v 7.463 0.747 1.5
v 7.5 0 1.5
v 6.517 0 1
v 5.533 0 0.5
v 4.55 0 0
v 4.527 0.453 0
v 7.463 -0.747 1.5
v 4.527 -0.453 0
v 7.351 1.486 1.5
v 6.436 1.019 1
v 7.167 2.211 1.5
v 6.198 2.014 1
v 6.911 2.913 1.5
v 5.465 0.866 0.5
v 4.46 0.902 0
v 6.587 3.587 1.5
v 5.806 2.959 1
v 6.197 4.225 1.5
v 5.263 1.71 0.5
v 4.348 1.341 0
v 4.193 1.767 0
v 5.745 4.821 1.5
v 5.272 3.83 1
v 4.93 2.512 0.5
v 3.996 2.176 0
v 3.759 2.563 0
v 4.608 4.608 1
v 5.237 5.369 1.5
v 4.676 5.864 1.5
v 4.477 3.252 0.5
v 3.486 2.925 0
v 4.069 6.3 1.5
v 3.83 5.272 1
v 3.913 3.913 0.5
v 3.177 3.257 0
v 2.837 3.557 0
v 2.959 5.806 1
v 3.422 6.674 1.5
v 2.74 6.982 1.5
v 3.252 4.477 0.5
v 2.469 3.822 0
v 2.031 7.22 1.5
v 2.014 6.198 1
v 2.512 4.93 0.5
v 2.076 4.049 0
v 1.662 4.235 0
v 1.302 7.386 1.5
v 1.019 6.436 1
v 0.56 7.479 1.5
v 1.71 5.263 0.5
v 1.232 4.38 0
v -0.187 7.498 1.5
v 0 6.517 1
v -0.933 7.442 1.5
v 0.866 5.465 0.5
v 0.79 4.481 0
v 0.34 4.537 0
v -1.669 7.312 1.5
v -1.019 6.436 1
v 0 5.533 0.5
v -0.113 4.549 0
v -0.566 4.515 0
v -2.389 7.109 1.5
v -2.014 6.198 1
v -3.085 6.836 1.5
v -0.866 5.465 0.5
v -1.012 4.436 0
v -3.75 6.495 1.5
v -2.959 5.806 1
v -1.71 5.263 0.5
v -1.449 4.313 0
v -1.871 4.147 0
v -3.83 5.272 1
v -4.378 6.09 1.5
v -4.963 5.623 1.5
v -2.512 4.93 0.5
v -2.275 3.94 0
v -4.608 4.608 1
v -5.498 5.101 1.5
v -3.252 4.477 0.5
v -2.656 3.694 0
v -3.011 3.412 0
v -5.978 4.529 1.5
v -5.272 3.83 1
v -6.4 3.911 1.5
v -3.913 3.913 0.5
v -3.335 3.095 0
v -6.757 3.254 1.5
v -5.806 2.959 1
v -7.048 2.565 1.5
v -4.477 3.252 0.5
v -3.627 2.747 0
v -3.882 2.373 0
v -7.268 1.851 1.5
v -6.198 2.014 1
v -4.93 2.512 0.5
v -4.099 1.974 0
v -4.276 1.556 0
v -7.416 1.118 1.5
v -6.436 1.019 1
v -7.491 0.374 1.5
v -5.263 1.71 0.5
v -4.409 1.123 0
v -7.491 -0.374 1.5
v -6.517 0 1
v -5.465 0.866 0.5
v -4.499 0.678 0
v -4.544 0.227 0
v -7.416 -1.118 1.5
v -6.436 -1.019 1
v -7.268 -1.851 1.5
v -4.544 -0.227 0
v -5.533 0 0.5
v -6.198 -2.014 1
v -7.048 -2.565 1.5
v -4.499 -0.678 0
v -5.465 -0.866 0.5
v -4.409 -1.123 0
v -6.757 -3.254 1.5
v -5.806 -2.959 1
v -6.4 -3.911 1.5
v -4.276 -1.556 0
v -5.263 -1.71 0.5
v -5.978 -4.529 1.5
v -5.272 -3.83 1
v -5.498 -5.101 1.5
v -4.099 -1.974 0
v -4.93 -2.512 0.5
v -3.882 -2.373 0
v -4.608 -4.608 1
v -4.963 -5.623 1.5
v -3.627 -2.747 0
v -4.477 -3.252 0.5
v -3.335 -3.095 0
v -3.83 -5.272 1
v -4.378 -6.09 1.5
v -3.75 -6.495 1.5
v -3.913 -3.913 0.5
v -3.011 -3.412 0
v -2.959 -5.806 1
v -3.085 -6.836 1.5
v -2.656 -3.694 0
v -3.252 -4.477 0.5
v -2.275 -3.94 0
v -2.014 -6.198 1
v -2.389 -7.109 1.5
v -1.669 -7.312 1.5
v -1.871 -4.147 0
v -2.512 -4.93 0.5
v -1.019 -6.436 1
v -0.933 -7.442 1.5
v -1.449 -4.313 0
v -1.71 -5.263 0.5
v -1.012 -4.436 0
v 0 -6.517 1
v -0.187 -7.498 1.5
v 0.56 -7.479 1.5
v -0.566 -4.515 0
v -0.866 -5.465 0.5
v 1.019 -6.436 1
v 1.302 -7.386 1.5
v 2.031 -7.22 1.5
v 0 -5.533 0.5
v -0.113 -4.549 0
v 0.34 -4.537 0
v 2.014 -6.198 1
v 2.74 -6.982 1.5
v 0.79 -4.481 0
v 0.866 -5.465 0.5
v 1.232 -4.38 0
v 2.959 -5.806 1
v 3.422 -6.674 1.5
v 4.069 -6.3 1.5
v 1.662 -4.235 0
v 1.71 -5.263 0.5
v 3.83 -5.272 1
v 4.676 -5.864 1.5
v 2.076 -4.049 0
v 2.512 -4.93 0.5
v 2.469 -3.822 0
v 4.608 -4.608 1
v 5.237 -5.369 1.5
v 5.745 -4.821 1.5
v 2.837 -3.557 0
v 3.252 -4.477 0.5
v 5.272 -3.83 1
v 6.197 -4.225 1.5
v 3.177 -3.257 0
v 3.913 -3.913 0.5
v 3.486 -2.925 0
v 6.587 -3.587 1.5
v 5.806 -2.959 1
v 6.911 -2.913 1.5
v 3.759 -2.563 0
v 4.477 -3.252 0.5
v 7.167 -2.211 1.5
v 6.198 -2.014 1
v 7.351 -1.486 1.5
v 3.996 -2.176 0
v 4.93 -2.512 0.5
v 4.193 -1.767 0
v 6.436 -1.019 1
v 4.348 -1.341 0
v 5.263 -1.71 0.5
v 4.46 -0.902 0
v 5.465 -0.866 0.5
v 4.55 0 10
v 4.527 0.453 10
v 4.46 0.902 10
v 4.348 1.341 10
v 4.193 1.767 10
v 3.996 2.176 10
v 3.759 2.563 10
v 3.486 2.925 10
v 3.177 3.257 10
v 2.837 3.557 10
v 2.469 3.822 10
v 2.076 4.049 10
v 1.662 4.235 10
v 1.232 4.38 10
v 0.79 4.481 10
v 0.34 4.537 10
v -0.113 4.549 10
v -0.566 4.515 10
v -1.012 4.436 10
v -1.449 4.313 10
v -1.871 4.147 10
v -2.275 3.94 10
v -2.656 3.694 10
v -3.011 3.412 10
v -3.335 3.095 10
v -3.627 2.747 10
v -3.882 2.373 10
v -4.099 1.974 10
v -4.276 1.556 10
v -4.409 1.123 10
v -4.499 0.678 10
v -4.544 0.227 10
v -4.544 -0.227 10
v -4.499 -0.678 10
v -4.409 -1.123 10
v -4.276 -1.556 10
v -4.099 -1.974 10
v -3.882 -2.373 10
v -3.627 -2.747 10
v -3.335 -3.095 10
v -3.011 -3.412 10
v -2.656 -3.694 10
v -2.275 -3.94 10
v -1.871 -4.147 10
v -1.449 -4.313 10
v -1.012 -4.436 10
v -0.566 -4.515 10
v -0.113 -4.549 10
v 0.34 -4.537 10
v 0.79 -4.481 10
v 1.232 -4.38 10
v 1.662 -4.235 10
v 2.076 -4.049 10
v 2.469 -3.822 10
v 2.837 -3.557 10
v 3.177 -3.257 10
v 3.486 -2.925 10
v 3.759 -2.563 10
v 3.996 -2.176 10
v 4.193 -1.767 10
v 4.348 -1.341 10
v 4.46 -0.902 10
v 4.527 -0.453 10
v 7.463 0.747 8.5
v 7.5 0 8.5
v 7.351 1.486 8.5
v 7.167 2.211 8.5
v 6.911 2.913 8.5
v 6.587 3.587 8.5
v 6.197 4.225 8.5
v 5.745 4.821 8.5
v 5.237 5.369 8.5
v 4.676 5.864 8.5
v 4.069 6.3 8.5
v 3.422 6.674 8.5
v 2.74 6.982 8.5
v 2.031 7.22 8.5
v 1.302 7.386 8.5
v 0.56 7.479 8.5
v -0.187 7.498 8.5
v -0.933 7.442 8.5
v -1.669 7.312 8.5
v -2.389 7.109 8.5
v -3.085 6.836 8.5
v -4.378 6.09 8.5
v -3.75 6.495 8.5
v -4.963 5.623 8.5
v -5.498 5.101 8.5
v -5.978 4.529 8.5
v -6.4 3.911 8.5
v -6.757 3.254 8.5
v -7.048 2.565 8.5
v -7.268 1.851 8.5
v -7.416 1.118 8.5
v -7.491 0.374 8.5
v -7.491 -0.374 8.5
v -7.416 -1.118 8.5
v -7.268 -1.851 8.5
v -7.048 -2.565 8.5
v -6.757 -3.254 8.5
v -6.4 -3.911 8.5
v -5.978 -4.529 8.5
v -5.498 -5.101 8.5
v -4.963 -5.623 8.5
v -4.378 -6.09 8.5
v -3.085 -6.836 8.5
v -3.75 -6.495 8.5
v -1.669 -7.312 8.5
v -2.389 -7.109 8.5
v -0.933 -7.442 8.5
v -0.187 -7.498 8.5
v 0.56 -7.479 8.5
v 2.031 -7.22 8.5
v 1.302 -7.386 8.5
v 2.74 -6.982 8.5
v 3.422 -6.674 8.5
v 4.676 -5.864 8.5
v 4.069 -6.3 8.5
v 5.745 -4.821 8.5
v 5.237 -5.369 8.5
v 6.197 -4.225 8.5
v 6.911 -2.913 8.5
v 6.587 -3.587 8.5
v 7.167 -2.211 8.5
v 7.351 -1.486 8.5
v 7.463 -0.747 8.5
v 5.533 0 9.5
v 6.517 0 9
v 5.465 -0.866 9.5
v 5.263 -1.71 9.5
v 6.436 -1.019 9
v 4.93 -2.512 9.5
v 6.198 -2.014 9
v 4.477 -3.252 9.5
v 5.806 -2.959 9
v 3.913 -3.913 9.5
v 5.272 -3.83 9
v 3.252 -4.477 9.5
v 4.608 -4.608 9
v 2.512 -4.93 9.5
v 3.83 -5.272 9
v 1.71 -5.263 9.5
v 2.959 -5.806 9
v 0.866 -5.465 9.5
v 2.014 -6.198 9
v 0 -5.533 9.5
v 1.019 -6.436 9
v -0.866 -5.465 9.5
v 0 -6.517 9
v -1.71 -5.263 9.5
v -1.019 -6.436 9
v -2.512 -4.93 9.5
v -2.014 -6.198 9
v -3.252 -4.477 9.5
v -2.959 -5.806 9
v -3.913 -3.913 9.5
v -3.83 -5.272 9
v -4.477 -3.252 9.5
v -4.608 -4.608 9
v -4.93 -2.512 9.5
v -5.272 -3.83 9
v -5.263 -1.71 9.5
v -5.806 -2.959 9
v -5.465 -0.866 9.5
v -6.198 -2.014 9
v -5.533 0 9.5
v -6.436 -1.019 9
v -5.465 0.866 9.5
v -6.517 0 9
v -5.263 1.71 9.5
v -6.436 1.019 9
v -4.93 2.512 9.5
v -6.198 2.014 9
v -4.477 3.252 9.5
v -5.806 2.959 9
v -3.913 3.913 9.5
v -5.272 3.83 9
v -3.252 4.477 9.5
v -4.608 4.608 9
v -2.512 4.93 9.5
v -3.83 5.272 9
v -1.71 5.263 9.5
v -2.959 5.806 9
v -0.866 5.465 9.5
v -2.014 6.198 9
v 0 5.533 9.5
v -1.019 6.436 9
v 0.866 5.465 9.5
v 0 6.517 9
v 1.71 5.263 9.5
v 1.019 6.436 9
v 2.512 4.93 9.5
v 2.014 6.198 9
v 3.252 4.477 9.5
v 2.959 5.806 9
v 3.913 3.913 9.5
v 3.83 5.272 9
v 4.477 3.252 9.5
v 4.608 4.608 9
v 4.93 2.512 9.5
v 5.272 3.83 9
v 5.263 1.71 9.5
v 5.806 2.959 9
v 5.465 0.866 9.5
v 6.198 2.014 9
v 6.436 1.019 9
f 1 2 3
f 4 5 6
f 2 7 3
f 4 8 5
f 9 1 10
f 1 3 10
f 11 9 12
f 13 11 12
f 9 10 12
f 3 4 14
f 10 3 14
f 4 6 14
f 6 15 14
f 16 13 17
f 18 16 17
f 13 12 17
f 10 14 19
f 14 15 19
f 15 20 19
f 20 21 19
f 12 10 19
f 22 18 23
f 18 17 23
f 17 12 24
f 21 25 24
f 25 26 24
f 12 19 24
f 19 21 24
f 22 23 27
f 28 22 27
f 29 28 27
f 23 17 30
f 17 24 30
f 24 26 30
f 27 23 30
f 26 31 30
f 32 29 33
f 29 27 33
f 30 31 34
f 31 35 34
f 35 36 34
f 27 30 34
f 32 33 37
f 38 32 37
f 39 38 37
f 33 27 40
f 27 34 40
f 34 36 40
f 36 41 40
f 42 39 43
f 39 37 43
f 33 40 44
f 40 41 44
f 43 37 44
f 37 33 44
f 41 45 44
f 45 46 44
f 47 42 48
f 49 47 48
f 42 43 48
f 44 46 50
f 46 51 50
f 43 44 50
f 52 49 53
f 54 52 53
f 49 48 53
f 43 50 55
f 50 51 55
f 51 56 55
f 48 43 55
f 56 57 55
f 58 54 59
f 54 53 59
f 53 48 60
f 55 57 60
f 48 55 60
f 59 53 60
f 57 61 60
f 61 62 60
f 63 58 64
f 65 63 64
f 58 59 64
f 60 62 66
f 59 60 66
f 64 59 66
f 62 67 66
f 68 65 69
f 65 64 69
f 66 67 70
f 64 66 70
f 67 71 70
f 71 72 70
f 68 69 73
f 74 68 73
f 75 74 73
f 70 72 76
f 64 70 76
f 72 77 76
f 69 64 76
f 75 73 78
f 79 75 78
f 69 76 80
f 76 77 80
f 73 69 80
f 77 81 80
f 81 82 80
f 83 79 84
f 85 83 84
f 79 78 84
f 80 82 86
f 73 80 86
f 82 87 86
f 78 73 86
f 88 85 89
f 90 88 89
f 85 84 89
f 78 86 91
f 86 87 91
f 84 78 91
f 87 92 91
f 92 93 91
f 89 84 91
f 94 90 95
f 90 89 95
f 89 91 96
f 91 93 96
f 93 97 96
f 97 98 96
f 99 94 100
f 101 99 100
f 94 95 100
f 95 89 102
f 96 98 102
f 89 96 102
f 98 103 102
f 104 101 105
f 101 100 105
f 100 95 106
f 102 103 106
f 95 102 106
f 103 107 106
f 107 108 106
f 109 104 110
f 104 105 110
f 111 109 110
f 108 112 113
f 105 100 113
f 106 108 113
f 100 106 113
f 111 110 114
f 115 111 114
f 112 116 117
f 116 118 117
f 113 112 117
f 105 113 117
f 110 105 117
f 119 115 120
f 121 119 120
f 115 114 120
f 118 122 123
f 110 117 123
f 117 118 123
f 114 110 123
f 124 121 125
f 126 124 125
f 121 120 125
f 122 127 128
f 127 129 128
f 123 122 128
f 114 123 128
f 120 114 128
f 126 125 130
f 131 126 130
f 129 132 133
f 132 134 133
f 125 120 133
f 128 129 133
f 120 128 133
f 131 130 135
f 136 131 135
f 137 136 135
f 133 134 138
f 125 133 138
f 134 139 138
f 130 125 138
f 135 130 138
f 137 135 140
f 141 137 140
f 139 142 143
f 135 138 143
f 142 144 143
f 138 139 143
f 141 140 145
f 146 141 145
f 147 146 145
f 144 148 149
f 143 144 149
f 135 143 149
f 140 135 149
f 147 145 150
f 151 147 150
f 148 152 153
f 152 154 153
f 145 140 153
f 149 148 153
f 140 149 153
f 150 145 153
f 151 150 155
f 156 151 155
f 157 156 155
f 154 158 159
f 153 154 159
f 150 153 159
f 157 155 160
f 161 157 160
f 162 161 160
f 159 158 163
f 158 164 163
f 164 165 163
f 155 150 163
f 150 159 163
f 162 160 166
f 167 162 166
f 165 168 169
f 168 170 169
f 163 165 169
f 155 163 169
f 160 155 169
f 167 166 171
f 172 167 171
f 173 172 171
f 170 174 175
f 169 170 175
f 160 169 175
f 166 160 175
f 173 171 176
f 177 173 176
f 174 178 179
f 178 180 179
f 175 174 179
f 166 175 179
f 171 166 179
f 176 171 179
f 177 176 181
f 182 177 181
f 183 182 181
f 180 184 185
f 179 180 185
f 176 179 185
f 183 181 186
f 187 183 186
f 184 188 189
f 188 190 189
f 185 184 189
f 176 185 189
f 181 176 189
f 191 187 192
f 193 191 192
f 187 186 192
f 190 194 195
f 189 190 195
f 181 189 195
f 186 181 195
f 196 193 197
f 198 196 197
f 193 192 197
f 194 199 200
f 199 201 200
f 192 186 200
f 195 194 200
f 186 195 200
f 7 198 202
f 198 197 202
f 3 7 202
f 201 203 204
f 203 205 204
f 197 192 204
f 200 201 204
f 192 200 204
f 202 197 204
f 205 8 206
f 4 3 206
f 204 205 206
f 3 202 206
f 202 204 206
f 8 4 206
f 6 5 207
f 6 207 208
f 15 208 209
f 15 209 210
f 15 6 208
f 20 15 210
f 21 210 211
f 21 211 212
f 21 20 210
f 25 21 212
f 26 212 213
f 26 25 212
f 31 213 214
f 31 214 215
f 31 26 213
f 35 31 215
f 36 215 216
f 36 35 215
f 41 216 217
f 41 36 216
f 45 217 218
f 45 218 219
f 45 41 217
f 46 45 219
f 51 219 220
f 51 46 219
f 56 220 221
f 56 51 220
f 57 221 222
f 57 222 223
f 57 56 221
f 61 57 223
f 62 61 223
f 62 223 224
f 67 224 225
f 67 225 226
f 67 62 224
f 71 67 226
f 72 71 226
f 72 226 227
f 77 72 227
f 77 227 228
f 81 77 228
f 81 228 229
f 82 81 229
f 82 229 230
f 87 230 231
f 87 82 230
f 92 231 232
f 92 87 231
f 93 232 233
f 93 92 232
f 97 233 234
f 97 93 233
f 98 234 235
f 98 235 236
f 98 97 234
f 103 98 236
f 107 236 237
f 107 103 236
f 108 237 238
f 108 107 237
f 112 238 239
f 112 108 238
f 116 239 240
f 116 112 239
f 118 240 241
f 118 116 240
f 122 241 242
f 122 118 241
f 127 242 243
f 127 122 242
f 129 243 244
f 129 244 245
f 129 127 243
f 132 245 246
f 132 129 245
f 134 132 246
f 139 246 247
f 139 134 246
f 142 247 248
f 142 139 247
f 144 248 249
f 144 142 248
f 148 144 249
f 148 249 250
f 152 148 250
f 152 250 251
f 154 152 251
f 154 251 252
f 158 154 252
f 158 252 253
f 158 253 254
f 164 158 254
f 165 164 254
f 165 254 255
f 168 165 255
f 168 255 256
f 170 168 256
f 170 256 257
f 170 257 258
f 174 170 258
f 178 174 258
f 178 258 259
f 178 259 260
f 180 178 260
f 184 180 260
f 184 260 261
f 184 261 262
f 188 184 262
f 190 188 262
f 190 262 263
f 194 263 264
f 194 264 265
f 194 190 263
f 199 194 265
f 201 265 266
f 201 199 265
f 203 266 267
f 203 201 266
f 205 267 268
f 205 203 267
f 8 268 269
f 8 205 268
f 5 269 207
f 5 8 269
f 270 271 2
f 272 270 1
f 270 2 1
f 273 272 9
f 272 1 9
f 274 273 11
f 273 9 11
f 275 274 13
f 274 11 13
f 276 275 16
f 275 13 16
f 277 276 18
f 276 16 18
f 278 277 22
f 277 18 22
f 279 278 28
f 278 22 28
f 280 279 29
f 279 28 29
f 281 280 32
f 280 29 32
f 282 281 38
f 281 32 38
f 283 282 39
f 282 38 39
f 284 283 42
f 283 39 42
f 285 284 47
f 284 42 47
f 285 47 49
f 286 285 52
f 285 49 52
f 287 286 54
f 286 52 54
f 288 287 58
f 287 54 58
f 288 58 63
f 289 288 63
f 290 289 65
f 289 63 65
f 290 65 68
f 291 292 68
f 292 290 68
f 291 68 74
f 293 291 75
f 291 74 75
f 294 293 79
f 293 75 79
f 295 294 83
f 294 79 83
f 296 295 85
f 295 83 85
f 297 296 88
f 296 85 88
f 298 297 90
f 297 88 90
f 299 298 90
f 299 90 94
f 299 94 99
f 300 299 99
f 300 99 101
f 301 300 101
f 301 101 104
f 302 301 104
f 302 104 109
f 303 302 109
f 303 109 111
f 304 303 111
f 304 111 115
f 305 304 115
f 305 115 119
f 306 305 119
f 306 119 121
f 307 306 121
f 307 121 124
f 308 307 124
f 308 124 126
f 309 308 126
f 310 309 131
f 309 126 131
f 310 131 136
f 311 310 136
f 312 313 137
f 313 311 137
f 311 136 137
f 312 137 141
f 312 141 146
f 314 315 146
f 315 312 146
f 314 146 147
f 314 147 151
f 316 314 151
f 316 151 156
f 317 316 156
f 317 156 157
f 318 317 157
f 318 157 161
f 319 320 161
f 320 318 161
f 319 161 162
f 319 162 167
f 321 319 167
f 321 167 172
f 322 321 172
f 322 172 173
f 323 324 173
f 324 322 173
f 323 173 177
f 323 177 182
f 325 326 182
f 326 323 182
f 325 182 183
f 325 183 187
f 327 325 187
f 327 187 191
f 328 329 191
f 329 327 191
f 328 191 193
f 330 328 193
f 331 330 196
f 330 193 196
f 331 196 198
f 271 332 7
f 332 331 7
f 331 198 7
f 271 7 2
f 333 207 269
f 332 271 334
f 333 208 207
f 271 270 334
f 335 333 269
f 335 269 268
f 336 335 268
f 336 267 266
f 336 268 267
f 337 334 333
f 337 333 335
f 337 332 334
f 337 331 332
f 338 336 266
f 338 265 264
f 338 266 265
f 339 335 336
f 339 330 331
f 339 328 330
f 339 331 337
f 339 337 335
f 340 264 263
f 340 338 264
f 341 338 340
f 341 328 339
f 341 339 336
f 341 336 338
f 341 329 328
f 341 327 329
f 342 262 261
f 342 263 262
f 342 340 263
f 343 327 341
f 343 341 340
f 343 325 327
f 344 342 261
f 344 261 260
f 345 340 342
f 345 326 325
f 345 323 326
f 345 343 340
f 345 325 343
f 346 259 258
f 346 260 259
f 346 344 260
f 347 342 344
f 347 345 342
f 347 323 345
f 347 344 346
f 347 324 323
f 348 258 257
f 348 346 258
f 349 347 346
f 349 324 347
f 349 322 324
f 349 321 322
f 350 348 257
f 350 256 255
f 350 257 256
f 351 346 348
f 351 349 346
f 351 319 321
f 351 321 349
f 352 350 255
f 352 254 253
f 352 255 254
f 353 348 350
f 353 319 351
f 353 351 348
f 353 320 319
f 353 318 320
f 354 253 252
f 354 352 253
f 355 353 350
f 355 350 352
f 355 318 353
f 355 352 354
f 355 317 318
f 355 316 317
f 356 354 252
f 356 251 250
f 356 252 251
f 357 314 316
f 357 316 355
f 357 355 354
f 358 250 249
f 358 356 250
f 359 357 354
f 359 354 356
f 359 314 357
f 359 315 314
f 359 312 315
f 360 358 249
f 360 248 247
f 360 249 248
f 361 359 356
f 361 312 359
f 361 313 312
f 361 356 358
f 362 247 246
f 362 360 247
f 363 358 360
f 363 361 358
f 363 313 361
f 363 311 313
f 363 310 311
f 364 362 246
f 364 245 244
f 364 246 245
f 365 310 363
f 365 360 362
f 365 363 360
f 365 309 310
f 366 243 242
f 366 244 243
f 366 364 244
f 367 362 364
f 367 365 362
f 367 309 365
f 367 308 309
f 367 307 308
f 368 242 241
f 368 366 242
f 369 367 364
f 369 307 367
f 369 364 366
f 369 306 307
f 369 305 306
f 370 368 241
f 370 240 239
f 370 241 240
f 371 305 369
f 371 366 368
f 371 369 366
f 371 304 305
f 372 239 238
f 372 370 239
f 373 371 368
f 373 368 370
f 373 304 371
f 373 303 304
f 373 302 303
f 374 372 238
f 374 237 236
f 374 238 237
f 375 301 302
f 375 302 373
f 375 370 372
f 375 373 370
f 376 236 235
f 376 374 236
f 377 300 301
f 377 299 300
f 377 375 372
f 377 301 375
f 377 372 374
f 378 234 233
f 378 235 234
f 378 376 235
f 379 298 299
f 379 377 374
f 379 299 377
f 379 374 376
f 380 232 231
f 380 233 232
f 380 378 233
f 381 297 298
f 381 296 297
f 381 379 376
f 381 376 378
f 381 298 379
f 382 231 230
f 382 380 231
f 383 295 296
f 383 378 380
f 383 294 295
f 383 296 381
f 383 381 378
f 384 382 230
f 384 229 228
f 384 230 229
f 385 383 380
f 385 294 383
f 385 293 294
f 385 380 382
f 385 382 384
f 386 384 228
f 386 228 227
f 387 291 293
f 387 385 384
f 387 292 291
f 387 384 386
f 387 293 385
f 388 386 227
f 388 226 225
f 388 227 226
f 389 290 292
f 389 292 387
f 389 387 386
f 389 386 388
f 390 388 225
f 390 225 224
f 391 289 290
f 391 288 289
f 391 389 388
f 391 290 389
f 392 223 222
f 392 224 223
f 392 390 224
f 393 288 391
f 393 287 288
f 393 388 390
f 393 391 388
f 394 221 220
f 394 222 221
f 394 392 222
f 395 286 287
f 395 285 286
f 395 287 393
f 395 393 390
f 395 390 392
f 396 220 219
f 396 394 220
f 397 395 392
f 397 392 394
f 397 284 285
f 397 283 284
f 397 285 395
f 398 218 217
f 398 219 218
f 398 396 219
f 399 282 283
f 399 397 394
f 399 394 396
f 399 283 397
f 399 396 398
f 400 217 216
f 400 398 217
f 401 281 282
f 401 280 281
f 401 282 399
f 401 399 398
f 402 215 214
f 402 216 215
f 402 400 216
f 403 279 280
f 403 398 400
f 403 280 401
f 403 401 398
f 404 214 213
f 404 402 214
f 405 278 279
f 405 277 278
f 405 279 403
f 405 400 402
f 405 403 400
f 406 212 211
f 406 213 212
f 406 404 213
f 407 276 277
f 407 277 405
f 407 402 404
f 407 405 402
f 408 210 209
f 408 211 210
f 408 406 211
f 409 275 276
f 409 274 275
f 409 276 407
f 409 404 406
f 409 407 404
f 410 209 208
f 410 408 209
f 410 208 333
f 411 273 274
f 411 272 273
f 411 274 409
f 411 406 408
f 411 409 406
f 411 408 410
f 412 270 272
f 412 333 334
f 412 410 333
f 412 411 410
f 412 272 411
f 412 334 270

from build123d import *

# Parameters (mm, degrees)
F0_R     = 7.5
F0_R_2   = 4.55
F1_DEPTH = 10


with BuildPart() as f1:
    # F0 (on Top) → F1 (new body)
    with BuildSketch(Plane.XY):
        Circle(F0_R)
        Circle(F0_R_2, mode=Mode.SUBTRACT)
    extrude(amount=F1_DEPTH)

    # F2 (on Front) → F4 (revolve, cut)
    with BuildSketch(Plane.XZ):
        Polygon((7.5, 1.5), (4.55, 0), (7.5, 0), align=None)
    revolve(axis=Axis((0, 0, 29.497309), (0, 0, 1)), mode=Mode.SUBTRACT)

    # F5 (on Front) → F6 (revolve, cut)
    with BuildSketch(Plane.XZ):
        Polygon((7.5, 10), (4.55, 10), (7.5, 8.5), align=None)
    revolve(axis=Axis((0, 0, 0), (0, 0, -1)), mode=Mode.SUBTRACT)


solid = f1.part
